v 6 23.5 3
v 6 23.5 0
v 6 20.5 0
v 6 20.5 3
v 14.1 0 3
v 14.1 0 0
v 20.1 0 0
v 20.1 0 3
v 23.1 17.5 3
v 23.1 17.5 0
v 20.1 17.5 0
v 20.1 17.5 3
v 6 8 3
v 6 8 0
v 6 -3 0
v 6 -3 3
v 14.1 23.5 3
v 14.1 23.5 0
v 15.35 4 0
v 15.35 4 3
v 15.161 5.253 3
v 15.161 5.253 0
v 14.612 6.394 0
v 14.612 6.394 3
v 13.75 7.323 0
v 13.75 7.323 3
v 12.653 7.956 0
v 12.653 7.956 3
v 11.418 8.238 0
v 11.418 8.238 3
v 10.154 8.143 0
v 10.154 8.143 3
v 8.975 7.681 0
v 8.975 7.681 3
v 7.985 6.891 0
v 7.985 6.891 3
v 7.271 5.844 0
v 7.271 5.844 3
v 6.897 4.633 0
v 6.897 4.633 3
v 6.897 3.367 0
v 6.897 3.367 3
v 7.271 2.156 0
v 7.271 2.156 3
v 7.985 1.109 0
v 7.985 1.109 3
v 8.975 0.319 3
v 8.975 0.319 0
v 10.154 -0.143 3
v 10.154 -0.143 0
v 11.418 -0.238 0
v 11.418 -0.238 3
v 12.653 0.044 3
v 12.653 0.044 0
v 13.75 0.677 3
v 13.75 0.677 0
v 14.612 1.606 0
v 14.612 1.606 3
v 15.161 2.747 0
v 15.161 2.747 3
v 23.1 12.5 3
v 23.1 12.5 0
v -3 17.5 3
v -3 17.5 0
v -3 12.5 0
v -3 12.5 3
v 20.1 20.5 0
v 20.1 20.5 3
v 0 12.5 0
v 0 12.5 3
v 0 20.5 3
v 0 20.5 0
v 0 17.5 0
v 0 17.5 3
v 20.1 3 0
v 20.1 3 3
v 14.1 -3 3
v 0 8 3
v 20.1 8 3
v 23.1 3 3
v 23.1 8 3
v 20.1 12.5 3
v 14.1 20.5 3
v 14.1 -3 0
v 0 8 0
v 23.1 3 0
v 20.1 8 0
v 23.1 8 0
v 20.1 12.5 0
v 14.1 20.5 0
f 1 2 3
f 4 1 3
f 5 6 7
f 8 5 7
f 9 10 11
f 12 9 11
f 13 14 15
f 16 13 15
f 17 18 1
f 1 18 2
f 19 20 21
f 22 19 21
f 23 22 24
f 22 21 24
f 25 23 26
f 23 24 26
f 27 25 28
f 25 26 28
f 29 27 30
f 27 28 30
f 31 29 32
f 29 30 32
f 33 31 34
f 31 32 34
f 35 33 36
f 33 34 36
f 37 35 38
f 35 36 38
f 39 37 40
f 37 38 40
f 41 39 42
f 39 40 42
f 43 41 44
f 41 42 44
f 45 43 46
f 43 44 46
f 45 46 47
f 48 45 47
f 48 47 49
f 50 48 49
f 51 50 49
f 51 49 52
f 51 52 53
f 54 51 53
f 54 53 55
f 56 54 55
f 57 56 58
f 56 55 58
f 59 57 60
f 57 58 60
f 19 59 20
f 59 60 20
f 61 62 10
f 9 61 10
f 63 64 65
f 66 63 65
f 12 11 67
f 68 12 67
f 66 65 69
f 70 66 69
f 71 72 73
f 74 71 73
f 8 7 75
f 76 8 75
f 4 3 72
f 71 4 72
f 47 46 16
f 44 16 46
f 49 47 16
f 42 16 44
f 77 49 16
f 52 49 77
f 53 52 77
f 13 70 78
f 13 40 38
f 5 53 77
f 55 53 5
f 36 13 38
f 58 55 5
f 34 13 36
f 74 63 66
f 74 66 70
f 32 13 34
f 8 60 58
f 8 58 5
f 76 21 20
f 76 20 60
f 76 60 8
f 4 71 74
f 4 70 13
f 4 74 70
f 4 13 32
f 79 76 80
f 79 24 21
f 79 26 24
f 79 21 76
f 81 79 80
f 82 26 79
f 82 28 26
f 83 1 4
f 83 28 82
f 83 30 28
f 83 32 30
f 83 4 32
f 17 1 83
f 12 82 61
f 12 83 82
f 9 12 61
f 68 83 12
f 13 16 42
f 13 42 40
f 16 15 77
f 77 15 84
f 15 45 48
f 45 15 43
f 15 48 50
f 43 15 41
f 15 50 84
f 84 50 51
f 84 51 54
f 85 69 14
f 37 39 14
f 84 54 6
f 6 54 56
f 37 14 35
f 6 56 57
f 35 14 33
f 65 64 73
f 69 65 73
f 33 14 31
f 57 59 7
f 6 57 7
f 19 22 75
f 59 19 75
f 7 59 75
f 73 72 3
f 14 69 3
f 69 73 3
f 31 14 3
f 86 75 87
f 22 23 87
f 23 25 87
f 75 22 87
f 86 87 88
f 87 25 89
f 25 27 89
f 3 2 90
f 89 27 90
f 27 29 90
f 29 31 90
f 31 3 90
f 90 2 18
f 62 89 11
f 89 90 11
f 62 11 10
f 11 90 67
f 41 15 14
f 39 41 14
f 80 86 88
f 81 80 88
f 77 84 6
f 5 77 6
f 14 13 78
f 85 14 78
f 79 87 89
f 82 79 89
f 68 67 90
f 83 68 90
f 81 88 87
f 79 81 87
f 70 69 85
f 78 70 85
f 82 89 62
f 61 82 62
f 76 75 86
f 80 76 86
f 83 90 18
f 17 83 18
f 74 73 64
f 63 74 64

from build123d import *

# Parameters (mm, degrees)
BASE_DEPTH            = 3
ESBO_O1_R             = 4.25
PASSAGEMLEDELDR_DEPTH = 3


with BuildPart() as part:
    # BaseEsboco → Base (new body)
    with BuildSketch(Plane.XY):
        Polygon((0, 0), (6, 0), (6, -3), (14.1, -3), (14.1, 0), (20.1, 0), (20.1, 3), (23.1, 3), (23.1, 8), (20.1, 8), (20.1, 12.5), (23.1, 12.5), (23.1, 17.5), (20.1, 17.5), (20.1, 20.5), (14.1, 20.5), (14.1, 23.5), (6, 23.5), (6, 20.5), (0, 20.5), (0, 17.5), (-3, 17.5), (-3, 12.5), (0, 12.5), (0, 8), (-3, 8), (-3, 3), (0, 3), align=None)
    extrude(amount=BASE_DEPTH)

    # Esboço1 → PassagemLEDeLDR (cut)
    with BuildSketch(Plane.XY.offset(3)):
        with Locations((11.1, 4)):
            Circle(ESBO_O1_R)
        Polygon((0, 8), (6, 8), (6, 0), (0, 0), (0, 3), (-3, 3), (-3, 8), align=None)
    extrude(amount=-PASSAGEMLEDELDR_DEPTH, mode=Mode.SUBTRACT)


solid = part.part
